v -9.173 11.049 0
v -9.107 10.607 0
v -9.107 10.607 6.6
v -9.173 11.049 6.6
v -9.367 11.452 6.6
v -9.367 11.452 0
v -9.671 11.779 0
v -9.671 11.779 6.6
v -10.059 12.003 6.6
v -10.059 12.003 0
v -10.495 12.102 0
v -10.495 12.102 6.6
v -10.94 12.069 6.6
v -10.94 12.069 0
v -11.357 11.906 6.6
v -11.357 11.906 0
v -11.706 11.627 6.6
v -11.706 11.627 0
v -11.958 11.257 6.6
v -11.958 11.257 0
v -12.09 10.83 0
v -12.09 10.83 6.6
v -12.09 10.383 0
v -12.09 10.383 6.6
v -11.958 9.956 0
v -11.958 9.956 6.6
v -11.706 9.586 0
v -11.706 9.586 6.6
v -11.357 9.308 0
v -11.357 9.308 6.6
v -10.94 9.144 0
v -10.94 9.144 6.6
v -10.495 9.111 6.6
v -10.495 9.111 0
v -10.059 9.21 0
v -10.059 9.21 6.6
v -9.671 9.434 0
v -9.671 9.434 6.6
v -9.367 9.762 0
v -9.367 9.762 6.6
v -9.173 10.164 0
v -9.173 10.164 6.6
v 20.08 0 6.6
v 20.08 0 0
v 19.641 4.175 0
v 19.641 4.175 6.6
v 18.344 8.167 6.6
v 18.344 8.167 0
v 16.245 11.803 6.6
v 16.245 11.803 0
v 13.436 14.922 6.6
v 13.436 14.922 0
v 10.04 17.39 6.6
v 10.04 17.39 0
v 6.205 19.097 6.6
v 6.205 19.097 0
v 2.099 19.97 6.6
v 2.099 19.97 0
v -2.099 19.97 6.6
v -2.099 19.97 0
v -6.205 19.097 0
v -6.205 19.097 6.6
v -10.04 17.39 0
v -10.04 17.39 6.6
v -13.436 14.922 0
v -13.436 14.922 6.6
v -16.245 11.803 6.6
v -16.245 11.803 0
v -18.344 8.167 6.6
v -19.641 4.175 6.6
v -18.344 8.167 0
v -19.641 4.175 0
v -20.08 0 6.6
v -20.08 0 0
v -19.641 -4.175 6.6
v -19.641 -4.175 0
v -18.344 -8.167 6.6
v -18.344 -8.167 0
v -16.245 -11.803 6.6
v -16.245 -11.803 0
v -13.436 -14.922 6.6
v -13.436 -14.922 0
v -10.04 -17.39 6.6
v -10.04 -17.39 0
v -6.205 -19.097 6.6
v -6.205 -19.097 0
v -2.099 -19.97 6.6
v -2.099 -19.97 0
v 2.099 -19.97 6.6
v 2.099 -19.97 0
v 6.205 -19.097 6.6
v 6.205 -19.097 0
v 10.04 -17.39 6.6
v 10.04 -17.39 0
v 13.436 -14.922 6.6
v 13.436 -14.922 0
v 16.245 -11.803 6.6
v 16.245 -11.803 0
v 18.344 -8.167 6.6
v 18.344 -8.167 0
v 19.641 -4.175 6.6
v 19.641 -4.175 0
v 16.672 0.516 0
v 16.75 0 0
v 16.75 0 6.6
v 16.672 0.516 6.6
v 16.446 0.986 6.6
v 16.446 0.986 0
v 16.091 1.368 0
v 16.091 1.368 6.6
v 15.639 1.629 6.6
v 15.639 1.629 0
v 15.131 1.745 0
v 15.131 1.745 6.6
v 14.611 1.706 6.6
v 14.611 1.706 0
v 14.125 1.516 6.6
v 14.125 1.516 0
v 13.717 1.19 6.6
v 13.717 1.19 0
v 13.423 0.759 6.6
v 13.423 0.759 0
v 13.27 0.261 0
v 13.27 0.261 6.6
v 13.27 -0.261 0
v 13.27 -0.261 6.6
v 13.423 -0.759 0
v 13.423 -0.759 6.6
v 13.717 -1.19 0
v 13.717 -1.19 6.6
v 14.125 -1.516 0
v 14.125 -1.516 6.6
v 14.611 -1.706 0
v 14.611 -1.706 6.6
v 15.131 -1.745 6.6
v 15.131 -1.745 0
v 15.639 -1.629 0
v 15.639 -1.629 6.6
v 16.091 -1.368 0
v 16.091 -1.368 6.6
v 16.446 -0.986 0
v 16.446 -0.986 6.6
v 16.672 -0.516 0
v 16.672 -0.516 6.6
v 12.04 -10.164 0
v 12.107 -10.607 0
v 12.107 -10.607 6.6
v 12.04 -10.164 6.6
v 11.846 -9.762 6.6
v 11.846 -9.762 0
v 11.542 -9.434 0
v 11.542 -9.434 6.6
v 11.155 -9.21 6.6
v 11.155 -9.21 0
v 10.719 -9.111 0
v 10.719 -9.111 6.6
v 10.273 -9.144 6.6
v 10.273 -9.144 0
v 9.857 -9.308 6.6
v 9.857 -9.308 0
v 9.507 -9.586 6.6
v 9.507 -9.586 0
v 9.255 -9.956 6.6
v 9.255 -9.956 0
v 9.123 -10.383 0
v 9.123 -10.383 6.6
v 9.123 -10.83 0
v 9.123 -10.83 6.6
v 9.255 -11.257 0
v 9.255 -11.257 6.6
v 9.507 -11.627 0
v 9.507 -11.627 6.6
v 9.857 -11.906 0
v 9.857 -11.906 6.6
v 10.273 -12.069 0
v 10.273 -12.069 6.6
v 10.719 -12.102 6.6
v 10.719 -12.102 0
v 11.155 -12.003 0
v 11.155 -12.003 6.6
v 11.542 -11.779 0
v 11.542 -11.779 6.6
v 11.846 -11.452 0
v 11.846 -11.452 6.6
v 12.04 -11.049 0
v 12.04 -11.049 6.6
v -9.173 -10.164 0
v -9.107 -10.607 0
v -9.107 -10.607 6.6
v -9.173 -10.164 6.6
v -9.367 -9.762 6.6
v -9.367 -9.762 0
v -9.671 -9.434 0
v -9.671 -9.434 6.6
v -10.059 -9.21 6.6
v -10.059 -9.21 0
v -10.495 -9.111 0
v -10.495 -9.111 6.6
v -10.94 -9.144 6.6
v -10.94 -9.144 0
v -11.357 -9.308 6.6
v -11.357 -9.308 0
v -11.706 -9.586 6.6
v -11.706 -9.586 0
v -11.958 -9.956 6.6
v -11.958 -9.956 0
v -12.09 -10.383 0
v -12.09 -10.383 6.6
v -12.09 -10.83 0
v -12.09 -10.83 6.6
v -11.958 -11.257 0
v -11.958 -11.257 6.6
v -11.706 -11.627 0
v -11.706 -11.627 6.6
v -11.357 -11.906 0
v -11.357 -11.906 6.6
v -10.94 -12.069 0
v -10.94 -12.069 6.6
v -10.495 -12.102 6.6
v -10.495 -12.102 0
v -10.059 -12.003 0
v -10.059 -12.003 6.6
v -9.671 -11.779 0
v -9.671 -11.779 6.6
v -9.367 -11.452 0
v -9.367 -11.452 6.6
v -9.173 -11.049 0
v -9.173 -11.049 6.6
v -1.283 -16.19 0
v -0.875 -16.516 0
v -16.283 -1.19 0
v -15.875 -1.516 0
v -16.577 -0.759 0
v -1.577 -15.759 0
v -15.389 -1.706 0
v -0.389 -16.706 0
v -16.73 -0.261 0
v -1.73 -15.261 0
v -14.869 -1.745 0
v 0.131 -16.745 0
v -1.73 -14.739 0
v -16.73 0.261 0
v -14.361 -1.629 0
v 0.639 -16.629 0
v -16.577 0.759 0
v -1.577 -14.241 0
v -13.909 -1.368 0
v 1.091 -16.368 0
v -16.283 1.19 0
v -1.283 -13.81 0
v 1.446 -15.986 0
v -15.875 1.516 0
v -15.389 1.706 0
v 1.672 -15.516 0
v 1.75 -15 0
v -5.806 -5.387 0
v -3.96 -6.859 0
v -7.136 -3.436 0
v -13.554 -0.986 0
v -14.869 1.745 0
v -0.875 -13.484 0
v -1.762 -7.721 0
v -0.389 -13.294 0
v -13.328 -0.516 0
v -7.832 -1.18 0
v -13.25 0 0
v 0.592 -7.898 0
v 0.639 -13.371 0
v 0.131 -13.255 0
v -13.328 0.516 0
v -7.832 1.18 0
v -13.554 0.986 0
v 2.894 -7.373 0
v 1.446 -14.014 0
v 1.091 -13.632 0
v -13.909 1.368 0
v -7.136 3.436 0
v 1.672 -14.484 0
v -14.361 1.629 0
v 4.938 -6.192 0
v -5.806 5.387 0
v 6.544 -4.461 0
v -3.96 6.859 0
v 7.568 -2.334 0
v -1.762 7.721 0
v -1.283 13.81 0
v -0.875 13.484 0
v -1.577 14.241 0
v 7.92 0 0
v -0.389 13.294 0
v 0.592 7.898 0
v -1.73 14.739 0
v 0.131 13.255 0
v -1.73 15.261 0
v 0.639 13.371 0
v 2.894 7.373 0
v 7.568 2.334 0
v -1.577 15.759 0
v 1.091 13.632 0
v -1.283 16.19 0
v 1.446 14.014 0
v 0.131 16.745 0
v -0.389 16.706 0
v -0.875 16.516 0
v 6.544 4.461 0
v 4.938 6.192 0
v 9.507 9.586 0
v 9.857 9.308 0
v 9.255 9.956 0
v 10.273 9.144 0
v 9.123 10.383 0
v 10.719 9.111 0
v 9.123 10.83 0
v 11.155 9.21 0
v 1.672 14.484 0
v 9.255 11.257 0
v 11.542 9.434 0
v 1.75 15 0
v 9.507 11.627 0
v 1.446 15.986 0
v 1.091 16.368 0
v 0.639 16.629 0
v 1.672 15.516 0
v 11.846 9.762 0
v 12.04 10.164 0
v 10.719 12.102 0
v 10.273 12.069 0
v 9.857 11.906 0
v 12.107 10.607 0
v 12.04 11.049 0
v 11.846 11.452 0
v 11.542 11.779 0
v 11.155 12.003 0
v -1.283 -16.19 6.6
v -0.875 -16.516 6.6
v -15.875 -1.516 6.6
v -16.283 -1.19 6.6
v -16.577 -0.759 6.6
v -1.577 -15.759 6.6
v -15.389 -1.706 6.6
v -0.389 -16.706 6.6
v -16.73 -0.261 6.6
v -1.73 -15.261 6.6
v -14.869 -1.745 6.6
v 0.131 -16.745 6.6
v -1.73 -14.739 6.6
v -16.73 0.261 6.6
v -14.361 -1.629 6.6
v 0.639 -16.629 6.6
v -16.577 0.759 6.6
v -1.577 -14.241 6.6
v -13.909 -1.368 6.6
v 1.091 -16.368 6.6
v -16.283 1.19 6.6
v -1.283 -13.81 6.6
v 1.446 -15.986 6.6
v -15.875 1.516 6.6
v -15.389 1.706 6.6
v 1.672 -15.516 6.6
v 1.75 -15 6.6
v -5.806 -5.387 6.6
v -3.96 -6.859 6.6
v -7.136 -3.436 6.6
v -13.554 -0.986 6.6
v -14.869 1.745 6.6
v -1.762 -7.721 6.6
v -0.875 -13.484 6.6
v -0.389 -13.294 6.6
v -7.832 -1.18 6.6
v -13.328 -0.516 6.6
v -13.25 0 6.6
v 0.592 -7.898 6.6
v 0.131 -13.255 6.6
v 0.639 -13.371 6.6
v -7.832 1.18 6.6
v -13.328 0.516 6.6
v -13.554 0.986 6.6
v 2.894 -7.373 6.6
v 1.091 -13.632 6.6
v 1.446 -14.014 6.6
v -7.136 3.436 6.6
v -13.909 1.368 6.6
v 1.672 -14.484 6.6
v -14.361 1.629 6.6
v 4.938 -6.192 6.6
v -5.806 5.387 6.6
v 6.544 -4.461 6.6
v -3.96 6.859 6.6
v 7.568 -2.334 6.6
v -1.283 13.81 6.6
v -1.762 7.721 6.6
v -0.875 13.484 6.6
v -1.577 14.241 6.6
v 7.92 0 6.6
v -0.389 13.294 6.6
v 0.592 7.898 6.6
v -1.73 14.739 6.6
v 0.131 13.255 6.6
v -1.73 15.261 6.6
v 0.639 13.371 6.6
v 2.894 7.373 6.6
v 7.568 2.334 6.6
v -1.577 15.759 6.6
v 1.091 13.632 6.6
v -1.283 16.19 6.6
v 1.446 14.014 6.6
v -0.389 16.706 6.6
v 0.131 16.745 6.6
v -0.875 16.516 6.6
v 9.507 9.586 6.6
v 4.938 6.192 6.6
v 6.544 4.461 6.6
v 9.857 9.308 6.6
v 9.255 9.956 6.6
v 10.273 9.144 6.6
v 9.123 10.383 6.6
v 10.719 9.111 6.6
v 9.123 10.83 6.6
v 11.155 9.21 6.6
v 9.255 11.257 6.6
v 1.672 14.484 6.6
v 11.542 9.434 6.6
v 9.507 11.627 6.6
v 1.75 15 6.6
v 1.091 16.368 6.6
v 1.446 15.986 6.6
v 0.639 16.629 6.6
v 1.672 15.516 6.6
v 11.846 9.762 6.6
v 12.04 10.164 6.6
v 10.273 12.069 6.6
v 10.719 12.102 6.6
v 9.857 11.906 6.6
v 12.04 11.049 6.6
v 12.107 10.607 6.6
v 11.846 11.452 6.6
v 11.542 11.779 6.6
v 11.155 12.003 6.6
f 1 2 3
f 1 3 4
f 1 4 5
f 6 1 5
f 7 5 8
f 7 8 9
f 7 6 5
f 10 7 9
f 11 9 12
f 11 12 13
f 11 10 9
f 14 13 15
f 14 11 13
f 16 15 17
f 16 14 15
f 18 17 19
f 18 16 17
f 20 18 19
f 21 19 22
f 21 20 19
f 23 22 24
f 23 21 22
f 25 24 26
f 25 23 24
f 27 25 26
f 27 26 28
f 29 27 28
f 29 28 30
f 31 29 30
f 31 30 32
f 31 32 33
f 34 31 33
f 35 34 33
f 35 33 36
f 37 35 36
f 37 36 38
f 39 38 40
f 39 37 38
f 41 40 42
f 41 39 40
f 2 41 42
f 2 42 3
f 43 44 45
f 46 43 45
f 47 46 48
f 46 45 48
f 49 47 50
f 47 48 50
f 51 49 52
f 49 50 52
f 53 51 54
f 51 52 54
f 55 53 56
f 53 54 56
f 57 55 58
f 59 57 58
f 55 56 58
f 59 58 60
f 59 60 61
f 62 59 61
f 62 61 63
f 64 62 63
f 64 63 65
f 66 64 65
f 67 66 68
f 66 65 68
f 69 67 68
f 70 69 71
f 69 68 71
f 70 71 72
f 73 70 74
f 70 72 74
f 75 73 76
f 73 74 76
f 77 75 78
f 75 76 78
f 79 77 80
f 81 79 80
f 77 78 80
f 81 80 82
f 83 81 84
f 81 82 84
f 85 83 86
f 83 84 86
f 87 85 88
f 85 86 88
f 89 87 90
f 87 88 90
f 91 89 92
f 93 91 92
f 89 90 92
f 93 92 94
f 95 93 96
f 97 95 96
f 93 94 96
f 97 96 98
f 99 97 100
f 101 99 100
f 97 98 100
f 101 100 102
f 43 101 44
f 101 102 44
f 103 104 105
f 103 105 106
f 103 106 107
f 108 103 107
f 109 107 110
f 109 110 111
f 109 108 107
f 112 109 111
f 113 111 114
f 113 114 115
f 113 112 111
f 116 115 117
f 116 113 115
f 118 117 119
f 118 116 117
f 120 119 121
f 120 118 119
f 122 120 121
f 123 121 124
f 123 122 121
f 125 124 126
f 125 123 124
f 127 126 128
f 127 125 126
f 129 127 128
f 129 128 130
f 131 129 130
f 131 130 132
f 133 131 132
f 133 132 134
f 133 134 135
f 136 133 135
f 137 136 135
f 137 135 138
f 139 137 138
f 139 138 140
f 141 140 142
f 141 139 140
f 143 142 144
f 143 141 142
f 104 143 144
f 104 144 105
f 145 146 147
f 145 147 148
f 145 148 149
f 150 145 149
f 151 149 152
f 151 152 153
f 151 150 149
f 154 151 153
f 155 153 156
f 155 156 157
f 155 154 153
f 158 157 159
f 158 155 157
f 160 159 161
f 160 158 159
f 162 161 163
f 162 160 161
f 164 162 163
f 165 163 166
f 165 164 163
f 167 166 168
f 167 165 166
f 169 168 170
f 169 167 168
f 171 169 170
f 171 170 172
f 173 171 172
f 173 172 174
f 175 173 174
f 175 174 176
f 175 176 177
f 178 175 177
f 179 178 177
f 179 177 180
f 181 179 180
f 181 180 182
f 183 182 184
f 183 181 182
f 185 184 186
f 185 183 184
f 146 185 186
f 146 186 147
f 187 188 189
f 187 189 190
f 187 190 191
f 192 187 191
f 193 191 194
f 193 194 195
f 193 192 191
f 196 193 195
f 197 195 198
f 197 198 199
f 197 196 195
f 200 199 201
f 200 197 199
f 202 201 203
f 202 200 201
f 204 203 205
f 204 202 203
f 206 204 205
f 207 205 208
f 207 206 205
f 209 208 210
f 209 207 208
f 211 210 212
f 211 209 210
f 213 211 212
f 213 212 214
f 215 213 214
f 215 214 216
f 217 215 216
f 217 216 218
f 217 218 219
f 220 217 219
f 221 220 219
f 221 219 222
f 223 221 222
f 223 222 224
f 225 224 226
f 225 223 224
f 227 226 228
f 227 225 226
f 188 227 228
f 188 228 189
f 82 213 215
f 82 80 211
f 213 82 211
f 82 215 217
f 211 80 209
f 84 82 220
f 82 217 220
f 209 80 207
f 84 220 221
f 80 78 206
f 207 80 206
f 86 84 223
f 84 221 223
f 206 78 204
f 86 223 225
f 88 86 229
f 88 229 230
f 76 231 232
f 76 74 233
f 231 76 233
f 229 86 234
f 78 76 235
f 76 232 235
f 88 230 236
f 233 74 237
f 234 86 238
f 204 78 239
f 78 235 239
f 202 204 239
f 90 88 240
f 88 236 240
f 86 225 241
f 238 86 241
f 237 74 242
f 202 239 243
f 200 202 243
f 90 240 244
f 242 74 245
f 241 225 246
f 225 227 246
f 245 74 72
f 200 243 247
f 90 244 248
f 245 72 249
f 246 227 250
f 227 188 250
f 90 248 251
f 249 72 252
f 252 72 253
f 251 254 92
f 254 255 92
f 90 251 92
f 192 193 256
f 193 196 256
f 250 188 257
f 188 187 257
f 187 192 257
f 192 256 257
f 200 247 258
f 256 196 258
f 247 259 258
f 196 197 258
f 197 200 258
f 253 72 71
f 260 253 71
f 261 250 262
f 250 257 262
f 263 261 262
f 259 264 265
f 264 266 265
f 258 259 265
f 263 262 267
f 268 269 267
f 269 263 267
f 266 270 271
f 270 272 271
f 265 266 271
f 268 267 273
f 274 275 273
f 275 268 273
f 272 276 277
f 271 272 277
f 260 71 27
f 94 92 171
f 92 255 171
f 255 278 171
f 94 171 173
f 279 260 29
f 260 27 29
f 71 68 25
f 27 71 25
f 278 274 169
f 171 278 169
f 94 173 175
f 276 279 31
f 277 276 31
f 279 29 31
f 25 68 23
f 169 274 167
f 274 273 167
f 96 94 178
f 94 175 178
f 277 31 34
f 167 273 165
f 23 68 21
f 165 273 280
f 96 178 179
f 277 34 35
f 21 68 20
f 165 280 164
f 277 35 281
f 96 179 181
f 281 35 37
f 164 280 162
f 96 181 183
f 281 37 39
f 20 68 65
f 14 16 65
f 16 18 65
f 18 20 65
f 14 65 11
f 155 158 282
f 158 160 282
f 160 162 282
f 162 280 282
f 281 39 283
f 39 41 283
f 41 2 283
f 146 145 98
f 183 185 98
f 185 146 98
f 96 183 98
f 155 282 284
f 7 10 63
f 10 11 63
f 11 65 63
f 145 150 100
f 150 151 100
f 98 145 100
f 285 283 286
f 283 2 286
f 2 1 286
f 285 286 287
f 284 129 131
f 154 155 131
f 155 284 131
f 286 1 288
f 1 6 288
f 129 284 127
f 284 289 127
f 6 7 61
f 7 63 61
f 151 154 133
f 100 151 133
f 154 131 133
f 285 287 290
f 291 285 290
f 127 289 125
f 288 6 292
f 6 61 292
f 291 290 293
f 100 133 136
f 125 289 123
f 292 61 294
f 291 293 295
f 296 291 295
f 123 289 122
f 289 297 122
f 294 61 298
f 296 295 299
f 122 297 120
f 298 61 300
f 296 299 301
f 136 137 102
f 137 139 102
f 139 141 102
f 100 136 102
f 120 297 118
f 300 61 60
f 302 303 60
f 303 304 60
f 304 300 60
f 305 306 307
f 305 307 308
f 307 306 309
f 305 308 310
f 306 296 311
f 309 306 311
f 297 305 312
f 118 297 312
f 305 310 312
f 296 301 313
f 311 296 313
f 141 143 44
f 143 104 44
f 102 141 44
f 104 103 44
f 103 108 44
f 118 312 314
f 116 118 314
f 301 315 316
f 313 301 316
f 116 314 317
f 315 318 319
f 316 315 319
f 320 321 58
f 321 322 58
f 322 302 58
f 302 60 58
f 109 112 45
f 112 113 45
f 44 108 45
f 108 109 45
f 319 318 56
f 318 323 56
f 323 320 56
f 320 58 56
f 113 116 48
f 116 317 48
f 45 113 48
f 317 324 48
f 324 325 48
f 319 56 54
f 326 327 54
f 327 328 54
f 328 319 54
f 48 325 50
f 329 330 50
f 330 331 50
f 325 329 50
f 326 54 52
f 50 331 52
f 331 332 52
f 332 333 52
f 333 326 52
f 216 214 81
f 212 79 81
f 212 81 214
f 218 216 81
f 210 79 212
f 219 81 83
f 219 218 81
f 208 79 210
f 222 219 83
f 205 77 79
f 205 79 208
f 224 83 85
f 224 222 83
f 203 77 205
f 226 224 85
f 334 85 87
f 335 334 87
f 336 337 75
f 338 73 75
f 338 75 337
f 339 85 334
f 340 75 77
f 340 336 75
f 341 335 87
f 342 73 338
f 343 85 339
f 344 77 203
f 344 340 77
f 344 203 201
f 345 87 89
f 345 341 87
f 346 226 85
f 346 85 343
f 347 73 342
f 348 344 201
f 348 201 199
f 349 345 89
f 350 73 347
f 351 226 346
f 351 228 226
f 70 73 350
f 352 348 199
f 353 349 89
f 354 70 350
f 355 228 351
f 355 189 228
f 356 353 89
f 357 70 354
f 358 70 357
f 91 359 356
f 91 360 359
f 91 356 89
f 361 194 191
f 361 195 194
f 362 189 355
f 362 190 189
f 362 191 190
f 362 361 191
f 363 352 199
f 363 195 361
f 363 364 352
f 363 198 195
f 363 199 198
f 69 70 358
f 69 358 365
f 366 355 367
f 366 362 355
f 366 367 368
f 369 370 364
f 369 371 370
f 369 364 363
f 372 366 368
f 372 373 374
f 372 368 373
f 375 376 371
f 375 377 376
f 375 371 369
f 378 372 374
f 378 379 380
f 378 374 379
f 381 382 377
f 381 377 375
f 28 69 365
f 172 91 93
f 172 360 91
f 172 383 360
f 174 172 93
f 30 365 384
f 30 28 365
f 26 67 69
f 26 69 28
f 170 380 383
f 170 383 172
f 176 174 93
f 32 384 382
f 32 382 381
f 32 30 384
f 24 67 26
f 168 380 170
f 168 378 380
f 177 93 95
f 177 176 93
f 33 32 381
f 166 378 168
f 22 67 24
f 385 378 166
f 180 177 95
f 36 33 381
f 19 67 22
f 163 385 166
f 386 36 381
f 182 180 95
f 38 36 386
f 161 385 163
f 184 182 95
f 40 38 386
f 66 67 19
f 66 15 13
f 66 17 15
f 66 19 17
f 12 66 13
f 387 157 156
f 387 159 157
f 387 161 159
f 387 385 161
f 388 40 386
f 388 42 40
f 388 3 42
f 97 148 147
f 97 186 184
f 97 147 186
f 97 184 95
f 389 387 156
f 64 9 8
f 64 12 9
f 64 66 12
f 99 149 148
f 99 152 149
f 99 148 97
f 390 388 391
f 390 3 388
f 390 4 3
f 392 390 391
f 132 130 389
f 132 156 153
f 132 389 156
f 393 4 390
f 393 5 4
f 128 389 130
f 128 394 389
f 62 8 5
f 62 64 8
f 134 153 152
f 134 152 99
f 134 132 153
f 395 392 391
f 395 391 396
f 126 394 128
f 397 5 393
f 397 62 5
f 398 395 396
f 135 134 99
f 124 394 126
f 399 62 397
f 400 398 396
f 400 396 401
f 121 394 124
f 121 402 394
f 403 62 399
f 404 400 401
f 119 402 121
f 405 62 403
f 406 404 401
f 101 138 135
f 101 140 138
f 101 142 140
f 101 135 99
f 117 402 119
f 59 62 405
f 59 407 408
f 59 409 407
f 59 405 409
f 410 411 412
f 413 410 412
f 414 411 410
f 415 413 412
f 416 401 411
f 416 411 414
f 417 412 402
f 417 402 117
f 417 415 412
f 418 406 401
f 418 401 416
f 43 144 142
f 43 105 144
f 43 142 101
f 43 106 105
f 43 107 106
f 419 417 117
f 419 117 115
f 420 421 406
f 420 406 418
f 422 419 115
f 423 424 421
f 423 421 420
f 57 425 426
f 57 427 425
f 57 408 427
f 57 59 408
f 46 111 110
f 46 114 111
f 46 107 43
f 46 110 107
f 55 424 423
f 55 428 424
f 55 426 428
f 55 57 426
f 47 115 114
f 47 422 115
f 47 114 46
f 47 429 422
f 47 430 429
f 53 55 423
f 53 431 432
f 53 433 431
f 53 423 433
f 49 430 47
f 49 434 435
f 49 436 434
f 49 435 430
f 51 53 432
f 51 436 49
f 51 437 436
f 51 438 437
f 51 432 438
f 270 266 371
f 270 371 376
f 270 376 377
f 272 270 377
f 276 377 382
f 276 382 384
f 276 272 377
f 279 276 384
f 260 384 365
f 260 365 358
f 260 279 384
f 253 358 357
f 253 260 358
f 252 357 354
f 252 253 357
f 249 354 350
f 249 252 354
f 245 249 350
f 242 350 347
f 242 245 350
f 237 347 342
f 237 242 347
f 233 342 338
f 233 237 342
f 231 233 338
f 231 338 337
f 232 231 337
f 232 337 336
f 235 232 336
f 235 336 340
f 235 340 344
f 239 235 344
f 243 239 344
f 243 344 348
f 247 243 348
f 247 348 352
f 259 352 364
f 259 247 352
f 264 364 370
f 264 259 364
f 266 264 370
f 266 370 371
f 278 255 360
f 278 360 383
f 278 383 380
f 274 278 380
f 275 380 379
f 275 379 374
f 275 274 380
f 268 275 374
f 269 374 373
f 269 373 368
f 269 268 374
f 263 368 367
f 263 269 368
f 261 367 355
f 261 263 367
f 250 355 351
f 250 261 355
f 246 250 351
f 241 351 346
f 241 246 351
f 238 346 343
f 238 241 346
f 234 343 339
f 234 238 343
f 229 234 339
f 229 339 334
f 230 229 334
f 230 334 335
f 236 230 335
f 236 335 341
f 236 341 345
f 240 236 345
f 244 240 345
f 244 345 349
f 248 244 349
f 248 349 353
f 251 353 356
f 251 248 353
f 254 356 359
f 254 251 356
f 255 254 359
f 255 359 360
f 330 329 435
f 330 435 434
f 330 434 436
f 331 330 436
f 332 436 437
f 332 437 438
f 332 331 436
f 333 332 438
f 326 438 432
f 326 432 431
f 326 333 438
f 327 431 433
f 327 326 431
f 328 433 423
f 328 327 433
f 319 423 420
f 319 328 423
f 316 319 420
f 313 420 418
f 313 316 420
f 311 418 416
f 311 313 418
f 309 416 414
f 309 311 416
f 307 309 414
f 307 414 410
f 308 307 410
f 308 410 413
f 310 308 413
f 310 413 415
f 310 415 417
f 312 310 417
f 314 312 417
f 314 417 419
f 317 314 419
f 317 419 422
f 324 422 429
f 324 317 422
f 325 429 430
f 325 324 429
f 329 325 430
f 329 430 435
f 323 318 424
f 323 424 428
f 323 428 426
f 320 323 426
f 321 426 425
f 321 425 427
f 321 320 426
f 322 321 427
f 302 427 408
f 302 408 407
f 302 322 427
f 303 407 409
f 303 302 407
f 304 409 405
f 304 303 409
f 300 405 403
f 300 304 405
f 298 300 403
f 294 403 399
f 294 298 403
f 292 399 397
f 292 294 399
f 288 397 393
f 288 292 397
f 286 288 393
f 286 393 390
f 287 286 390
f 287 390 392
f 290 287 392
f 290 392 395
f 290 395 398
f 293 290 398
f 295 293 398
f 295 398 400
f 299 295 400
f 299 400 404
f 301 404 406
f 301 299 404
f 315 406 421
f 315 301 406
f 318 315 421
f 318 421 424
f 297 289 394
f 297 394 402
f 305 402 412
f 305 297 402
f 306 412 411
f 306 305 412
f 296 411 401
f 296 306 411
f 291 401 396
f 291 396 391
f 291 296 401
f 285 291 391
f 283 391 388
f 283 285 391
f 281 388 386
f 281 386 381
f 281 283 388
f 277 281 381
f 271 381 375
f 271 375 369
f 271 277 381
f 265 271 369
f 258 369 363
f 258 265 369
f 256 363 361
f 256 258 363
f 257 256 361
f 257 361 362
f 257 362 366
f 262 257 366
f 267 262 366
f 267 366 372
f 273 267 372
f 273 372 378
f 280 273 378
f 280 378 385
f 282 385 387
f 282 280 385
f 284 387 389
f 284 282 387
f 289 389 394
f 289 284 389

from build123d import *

# Parameters (mm, degrees)
SKETCH1_R           = 20
SKETCH1_R_2         = 8
SKETCH1_R_3         = 1.75
SKETCH1_R_4         = 1.5
BOSS_EXTRUDE1_DEPTH = 6.6
MOVE_FACE1_BY       = 0.08
MOVE_FACE1_2_BY     = 0.08


with BuildPart() as part:
    # Sketch1 → Boss-Extrude1 (new body)
    with BuildSketch(Plane.XY):
        Circle(SKETCH1_R)
        Circle(SKETCH1_R_2, mode=Mode.SUBTRACT)
        with Locations((0, 15)):
            Circle(SKETCH1_R_3, mode=Mode.SUBTRACT)
        with Locations((10.606601718, 10.606601718)):
            Circle(SKETCH1_R_4, mode=Mode.SUBTRACT)
        with Locations((15, 0)):
            Circle(SKETCH1_R_3, mode=Mode.SUBTRACT)
        with Locations((10.606601718, -10.606601718)):
            Circle(SKETCH1_R_4, mode=Mode.SUBTRACT)
        with Locations((0, -15)):
            Circle(SKETCH1_R_3, mode=Mode.SUBTRACT)
        with Locations((-10.606601718, -10.606601718)):
            Circle(SKETCH1_R_4, mode=Mode.SUBTRACT)
        with Locations((-15, 0)):
            Circle(SKETCH1_R_3, mode=Mode.SUBTRACT)
        with Locations((-10.606601718, 10.606601718)):
            Circle(SKETCH1_R_4, mode=Mode.SUBTRACT)
    extrude(amount=BOSS_EXTRUDE1_DEPTH)

    # Move Face1: a curved face moved outward by 0.08
    add(Solid.thicken(part.faces().sort_by_distance((-8, 0, 3.3))[0], MOVE_FACE1_BY))

    # Move Face1 2: a curved face moved outward by 0.08
    add(Solid.thicken(part.faces().sort_by_distance((-20, 0, 3.3))[0], MOVE_FACE1_2_BY))


solid = part.part
